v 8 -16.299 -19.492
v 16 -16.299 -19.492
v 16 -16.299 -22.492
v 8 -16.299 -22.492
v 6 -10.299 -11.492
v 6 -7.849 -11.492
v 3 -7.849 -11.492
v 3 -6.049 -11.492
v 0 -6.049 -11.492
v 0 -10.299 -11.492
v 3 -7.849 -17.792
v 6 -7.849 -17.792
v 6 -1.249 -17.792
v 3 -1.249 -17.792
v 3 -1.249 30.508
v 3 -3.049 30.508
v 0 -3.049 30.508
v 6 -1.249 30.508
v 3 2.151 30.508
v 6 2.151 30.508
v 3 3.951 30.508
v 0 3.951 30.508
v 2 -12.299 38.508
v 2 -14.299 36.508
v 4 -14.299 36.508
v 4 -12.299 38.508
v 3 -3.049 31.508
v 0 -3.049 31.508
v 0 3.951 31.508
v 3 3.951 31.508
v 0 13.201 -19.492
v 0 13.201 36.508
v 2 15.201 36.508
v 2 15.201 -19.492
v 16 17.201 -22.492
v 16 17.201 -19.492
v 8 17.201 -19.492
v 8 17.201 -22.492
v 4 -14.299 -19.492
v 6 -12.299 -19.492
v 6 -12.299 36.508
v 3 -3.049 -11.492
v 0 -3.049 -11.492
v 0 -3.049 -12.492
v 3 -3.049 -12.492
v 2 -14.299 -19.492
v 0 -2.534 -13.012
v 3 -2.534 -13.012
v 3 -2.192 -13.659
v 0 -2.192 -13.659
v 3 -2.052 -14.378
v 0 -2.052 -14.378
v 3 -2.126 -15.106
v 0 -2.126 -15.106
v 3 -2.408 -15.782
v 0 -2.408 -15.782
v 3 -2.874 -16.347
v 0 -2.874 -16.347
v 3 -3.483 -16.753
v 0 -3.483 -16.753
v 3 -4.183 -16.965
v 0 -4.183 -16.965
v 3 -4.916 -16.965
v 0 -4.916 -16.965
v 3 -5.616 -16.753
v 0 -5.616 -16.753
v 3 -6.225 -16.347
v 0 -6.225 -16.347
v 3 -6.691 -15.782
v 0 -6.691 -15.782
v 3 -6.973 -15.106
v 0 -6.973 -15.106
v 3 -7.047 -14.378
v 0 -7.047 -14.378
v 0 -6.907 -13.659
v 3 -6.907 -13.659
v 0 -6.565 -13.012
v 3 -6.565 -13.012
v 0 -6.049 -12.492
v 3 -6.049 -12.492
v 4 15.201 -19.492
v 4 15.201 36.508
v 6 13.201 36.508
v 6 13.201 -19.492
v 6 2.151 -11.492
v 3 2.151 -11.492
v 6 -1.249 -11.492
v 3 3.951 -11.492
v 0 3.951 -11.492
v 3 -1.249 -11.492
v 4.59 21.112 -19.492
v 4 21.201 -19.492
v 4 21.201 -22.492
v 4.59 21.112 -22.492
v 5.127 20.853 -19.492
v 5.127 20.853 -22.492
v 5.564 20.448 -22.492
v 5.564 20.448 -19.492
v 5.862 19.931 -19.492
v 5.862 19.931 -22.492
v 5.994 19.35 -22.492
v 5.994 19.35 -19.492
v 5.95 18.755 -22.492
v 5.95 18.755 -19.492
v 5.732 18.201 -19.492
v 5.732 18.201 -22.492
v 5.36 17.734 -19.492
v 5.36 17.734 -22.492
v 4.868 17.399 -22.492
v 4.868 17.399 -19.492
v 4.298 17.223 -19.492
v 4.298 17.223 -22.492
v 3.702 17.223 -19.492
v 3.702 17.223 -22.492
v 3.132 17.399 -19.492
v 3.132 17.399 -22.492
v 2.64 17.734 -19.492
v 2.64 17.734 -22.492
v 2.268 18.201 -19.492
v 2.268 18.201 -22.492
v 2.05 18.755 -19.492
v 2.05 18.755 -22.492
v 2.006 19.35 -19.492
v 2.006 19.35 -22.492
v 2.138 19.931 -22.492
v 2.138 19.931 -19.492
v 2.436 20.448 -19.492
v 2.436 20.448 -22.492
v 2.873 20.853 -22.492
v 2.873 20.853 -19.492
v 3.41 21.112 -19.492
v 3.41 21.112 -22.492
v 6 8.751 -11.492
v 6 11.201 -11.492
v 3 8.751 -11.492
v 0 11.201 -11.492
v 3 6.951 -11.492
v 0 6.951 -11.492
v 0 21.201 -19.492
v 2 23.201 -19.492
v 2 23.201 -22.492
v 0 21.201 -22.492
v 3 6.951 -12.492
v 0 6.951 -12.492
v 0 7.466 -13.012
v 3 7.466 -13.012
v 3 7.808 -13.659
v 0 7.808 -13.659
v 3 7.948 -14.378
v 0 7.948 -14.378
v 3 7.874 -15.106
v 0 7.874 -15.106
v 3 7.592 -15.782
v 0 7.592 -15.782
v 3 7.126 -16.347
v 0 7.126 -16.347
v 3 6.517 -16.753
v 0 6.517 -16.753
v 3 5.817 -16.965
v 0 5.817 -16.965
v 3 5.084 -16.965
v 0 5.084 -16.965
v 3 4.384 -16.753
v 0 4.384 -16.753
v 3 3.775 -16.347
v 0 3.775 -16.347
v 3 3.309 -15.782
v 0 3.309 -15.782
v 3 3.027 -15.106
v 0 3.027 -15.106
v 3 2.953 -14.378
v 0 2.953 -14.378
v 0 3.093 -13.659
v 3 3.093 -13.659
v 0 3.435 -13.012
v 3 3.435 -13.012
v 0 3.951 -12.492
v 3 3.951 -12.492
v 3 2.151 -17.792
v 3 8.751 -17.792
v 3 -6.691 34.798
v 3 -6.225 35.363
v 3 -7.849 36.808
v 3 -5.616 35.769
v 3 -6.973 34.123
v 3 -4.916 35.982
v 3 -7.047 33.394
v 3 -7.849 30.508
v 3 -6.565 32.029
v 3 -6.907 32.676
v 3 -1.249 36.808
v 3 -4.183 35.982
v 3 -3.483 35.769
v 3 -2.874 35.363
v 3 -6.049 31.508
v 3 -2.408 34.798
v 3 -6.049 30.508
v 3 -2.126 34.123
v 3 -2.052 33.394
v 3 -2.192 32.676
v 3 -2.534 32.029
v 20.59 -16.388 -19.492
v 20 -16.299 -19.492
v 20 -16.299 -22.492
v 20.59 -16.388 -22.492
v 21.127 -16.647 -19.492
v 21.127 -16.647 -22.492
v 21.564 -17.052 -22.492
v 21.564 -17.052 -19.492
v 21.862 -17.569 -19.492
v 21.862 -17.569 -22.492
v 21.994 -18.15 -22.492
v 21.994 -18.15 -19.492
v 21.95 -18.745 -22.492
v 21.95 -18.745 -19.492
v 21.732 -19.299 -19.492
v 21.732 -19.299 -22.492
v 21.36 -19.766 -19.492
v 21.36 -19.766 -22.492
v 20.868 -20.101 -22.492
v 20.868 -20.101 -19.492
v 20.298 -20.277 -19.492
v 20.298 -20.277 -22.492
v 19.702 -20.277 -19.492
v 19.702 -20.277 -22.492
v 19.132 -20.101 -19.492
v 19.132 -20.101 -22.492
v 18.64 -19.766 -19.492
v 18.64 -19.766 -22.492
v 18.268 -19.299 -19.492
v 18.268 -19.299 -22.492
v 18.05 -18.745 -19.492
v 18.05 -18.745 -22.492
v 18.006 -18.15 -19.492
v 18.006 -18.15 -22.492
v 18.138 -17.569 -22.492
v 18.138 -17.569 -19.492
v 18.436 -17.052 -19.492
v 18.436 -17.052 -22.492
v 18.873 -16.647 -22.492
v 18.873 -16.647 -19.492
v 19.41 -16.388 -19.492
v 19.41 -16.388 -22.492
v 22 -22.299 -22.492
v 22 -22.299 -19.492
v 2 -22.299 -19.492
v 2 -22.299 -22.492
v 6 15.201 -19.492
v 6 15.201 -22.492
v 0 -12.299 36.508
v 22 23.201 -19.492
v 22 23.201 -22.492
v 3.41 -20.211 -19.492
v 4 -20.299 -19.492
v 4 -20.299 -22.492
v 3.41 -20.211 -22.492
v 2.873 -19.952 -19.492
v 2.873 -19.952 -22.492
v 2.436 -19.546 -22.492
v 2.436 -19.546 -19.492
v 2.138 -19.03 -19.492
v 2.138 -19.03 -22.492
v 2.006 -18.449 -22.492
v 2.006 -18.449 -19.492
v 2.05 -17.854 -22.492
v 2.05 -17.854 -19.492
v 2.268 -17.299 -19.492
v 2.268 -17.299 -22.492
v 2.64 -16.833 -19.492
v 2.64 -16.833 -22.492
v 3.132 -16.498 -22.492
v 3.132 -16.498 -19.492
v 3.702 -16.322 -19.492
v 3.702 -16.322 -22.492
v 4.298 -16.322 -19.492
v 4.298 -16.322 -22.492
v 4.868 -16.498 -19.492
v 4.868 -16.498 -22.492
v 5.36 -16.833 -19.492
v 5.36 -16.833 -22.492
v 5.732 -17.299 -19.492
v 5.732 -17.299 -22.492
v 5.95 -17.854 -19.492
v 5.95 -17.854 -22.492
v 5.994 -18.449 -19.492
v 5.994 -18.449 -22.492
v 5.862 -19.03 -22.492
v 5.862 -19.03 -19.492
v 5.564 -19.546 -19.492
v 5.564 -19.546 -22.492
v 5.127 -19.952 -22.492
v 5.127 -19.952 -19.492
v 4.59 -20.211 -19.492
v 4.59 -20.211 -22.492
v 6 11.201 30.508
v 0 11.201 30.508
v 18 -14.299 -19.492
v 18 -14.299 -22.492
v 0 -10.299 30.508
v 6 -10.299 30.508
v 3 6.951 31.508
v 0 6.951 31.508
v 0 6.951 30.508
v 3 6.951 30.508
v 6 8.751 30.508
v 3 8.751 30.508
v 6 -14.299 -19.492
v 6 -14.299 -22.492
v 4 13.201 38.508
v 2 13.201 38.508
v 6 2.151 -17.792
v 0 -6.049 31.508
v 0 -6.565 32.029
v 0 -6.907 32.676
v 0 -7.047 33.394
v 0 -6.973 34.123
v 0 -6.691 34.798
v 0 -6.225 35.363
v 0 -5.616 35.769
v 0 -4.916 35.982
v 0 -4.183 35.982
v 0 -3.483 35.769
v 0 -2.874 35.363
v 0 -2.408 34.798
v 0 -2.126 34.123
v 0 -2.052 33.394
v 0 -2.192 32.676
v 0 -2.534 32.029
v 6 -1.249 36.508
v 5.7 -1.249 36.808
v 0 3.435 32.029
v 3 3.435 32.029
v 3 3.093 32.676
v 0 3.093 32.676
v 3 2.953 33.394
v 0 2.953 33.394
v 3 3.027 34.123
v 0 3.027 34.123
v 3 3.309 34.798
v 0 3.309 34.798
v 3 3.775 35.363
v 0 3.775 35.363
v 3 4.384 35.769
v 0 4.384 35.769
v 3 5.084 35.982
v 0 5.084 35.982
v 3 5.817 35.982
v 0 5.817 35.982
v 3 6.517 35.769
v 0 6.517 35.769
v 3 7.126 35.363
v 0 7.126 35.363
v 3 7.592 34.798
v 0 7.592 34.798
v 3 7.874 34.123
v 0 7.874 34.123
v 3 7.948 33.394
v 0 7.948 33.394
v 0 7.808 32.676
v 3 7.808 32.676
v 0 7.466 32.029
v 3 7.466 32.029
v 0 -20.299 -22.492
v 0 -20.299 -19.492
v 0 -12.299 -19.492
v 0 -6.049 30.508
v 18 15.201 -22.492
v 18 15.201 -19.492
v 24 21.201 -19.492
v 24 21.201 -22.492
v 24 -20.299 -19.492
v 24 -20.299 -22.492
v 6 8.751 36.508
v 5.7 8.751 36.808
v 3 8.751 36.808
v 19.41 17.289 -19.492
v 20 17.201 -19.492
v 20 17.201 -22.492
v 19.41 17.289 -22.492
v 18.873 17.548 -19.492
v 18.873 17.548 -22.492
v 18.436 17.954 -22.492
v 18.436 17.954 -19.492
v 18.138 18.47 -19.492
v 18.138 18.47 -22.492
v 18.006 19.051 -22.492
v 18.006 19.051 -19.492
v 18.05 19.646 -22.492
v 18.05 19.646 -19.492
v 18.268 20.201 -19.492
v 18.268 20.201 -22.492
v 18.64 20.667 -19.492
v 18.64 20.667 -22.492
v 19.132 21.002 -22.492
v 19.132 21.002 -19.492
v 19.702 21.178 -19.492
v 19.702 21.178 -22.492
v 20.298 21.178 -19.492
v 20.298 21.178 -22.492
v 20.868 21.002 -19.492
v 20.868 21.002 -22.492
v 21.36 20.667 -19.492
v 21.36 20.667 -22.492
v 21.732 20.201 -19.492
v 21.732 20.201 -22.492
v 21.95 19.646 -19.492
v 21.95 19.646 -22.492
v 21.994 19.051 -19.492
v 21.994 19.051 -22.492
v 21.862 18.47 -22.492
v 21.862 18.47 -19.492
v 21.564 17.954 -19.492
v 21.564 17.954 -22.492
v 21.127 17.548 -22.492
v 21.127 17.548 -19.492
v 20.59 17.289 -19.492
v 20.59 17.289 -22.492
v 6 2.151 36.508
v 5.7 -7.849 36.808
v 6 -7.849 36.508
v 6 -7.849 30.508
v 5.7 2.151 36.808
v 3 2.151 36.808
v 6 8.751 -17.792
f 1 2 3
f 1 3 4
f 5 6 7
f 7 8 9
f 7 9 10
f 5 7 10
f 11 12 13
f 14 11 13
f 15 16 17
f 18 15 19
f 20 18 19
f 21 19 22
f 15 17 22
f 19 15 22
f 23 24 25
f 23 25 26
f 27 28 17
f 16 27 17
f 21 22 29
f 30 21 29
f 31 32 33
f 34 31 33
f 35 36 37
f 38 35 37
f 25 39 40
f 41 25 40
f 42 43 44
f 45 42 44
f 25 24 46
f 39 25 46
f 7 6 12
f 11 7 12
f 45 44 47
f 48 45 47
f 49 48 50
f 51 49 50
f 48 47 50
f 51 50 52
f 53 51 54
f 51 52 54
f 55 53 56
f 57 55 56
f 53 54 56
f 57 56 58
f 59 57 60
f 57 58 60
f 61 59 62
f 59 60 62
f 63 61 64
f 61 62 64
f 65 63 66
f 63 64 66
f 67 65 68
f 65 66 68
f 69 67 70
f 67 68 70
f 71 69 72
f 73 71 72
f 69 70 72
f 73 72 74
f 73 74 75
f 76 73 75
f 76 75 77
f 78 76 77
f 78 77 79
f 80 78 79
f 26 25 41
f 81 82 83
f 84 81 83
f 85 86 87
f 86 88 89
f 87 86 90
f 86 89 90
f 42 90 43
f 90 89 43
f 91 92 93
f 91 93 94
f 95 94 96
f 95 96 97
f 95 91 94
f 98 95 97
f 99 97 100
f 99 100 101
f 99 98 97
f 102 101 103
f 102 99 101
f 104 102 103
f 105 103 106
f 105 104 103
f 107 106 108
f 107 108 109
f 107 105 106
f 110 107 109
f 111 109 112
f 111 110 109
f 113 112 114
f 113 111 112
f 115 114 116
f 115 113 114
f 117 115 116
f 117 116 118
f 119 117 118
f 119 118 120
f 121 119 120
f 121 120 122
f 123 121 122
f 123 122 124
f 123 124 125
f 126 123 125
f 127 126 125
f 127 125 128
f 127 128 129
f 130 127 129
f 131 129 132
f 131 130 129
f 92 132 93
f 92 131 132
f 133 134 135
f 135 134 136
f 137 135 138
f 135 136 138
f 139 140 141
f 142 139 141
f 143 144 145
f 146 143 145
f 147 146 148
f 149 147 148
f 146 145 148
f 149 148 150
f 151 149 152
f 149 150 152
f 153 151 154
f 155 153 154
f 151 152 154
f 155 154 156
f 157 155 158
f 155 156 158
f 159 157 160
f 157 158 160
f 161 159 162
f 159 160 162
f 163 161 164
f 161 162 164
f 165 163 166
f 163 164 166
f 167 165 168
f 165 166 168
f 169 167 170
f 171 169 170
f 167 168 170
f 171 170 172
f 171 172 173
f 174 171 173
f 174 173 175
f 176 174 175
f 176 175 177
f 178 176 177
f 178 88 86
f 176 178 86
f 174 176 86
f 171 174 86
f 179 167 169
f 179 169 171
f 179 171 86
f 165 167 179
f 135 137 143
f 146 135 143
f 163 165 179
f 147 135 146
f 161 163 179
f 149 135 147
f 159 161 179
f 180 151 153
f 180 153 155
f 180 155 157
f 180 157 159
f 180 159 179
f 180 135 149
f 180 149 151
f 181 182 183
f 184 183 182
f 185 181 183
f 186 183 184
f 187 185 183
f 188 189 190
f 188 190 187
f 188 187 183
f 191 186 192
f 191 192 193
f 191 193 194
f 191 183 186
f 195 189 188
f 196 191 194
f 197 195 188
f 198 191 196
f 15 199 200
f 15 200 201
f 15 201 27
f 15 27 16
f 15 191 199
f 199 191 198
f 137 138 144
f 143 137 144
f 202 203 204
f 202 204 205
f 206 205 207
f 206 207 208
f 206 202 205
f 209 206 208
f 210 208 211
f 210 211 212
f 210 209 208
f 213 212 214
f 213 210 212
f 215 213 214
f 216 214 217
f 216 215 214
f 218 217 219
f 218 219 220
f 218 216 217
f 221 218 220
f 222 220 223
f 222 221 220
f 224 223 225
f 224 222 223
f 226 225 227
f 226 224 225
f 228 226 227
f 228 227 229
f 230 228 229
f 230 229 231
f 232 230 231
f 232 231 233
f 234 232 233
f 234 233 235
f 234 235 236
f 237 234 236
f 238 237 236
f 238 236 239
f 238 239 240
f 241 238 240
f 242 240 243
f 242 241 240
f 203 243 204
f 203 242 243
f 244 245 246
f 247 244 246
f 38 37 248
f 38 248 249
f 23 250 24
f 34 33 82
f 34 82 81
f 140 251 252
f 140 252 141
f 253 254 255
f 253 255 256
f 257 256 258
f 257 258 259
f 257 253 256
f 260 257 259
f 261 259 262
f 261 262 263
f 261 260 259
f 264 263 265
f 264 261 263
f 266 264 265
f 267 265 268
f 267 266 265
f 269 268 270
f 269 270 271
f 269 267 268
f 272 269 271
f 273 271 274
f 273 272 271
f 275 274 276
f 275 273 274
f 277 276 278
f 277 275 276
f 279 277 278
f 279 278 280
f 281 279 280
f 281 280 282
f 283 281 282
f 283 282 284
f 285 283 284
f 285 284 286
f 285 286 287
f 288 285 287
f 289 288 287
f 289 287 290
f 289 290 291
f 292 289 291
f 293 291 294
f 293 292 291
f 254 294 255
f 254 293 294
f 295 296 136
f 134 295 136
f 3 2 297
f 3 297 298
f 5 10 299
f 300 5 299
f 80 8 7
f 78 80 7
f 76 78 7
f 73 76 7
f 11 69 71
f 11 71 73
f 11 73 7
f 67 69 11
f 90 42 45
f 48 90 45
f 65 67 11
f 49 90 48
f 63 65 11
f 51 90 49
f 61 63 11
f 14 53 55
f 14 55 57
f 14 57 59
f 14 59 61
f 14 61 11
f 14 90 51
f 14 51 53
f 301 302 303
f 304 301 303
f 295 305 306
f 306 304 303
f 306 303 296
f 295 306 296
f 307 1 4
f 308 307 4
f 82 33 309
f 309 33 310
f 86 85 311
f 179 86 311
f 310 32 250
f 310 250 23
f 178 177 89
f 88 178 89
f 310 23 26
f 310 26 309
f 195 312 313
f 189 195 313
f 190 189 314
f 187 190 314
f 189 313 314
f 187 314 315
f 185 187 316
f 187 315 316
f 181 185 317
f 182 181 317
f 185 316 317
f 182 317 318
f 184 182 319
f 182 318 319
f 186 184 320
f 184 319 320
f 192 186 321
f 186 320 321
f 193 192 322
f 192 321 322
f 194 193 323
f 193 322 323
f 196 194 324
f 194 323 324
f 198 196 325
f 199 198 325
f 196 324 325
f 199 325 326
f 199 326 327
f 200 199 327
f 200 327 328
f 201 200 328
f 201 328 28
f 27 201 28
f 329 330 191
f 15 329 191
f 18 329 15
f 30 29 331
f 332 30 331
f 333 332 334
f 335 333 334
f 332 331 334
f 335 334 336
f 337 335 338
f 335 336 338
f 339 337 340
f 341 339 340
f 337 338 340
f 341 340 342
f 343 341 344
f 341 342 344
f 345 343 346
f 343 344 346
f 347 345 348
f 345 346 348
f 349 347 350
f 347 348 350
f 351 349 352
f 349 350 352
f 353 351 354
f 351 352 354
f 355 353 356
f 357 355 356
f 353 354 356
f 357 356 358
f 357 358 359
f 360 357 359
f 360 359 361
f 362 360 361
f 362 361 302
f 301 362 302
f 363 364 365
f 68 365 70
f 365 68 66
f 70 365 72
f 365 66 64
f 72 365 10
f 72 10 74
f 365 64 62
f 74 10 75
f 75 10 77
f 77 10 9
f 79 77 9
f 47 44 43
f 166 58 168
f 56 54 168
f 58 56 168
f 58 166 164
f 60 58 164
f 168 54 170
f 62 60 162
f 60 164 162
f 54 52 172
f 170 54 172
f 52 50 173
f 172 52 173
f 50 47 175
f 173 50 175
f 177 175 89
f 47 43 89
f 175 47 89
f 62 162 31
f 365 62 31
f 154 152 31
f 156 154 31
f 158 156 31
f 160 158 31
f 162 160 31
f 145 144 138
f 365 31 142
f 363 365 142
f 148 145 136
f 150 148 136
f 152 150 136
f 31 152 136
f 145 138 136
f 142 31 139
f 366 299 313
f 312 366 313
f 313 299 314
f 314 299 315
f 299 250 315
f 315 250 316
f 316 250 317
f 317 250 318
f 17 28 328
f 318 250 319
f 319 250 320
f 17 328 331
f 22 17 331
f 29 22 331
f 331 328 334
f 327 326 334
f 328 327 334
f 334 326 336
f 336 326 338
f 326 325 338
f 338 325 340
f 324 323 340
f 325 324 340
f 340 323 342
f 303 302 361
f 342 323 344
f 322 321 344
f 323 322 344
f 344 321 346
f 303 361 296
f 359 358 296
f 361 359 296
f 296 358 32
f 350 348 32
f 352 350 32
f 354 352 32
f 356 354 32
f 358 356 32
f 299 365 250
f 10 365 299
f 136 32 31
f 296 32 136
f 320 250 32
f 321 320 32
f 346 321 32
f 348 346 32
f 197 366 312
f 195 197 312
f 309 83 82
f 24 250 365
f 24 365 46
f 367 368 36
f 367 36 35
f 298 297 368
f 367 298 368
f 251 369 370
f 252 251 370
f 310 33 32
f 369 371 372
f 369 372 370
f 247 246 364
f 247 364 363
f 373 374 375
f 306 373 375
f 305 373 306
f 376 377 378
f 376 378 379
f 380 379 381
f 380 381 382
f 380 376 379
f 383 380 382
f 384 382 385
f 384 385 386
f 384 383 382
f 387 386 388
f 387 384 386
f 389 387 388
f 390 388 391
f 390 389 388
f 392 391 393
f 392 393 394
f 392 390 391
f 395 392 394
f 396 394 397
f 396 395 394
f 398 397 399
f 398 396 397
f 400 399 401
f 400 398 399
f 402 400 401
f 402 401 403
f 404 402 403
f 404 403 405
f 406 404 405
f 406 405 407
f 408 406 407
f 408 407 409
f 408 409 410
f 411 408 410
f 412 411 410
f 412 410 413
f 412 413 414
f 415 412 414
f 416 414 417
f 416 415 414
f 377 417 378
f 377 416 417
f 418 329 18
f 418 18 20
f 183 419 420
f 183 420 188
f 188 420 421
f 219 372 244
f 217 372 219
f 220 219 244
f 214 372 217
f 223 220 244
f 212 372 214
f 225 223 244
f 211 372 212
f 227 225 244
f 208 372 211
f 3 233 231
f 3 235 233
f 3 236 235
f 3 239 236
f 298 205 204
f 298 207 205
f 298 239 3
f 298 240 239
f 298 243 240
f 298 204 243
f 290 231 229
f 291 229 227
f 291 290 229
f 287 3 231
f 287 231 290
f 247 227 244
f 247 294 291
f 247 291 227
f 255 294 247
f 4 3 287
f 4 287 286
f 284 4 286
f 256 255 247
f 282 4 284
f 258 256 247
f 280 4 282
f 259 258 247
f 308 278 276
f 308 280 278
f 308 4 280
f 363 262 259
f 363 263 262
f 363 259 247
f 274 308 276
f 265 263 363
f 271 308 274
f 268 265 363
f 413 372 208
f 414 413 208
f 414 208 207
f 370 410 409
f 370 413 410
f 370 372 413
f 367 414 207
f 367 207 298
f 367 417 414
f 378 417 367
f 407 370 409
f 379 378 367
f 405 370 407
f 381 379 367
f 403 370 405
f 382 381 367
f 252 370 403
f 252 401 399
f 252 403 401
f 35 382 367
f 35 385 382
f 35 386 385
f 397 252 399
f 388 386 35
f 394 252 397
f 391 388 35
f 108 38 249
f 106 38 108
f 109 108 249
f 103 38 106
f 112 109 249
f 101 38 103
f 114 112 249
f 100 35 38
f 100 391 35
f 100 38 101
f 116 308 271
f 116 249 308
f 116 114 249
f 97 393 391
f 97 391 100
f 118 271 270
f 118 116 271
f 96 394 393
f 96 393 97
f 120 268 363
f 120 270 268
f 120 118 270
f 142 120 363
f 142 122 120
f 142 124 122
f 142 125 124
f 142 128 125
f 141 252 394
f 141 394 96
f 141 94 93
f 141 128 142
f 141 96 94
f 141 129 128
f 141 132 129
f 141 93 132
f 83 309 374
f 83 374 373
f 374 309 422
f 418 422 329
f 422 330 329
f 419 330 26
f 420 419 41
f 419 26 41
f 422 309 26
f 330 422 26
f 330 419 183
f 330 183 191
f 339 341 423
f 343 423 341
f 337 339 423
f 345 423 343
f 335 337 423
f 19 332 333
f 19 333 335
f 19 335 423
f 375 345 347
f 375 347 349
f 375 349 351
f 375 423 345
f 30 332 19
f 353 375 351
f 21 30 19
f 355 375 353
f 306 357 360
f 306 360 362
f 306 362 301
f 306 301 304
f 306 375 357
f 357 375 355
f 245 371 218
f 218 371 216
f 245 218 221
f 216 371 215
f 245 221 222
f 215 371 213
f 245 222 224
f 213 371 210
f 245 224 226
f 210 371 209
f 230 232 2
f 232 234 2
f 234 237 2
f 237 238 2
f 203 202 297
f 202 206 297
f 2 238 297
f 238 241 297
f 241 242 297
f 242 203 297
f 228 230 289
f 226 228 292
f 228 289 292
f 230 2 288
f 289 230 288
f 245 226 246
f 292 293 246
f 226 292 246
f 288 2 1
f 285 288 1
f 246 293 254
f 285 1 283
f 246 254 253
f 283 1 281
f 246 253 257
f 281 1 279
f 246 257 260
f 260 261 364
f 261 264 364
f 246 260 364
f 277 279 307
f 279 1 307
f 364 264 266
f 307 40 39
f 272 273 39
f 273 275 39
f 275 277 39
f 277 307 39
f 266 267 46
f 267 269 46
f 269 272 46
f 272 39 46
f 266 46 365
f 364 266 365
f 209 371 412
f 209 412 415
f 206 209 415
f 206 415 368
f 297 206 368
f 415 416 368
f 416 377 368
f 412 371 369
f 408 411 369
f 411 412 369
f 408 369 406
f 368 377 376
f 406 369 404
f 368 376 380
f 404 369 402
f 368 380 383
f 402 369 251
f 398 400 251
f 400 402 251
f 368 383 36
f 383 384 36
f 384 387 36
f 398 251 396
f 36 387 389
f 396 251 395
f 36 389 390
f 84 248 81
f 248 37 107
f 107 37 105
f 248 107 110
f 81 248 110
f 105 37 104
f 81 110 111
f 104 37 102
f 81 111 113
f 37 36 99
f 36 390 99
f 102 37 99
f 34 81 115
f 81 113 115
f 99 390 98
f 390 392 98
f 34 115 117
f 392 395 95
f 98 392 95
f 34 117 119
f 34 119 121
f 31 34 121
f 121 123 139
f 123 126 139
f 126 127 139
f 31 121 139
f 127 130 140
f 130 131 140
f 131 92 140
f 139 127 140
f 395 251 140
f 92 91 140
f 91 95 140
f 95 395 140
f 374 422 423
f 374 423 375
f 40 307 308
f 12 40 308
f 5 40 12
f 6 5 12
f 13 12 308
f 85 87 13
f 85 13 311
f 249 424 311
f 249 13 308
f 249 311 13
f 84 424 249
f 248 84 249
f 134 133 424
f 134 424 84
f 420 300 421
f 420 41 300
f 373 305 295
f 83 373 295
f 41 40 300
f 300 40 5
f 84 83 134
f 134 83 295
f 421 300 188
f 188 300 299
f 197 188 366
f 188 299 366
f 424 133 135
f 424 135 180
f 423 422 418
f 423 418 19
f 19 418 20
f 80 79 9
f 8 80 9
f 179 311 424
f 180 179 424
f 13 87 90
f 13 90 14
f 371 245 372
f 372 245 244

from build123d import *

# Parameters (mm, degrees)
SKETCH1_W           = 58
SKETCH1_H           = 29.5
BOSS_EXTRUDE1_DEPTH = 6
SKETCH2_W           = 6.6
SKETCH2_H           = 6.6
CUT_EXTRUDE1_DEPTH  = 3
SKETCH3_W           = 24
SKETCH3_H           = 45.5
SKETCH3_R           = 2
SKETCH3_W_2         = 12
SKETCH3_H_2         = 33.5
BOSS_EXTRUDE2_DEPTH = 3
CHAMFER5_SIZE       = 2
CHAMFER6_SIZE       = 2
CHAMFER7_SIZE       = 2


with BuildPart() as part:
    # Sketch1 → Boss-Extrude1 (new body)
    with BuildSketch(Plane(origin=(0, 0, 0), x_dir=(0, 0, -1), z_dir=(1, 0, 0))):
        with Locations((-9.508456449, 0.450525737)):
            Rectangle(SKETCH1_W, SKETCH1_H)
        with BuildLine():
            Line((-31.508456449, 6.950525737), (-30.508456449, 6.950525737))
            Line((-30.508456449, 6.950525737), (-30.508456449, 11.200525737))
            Line((-30.508456449, 11.200525737), (11.491543551, 11.200525737))
            Line((11.491543551, 11.200525737), (11.491543551, 6.950525737))
            Line((11.491543551, 6.950525737), (12.491543551, 6.950525737))
            ThreePointArc((12.491543551, 6.950525737), (16.991543551, 5.450525737), (12.491543551, 3.950525737))
            Line((12.491543551, 3.950525737), (11.491543551, 3.950525737))
            Line((11.491543551, 3.950525737), (11.491543551, -3.049474263))
            Line((11.491543551, -3.049474263), (12.491543551, -3.049474263))
            ThreePointArc((12.491543551, -3.049474263), (16.991543551, -4.549474263), (12.491543551, -6.049474263))
            Line((12.491543551, -6.049474263), (11.491543551, -6.049474263))
            Line((11.491543551, -6.049474263), (11.491543551, -10.299474263))
            Line((11.491543551, -10.299474263), (-30.508456449, -10.299474263))
            Line((-30.508456449, -10.299474263), (-30.508456449, -6.049474263))
            Line((-30.508456449, -6.049474263), (-31.508456449, -6.049474263))
            ThreePointArc((-31.508456449, -6.049474263), (-36.008456449, -4.549474263), (-31.508456449, -3.049474263))
            Line((-31.508456449, -3.049474263), (-30.508456449, -3.049474263))
            Line((-30.508456449, -3.049474263), (-30.508456449, 3.950525737))
            Line((-30.508456449, 3.950525737), (-31.508456449, 3.950525737))
            ThreePointArc((-31.508456449, 3.950525737), (-36.008456449, 5.450525737), (-31.508456449, 6.950525737))
        make_face(mode=Mode.SUBTRACT)
    extrude(amount=BOSS_EXTRUDE1_DEPTH)

    # Sketch2 → Cut-Extrude1 (cut)
    with BuildSketch(Plane(origin=(6, 0, 0), x_dir=(0, 0, -1), z_dir=(1, 0, 0))):
        with Locations((-33.508456449, 5.450525737)):
            Rectangle(SKETCH2_W, SKETCH2_H)
        with Locations((14.491543551, 5.450525737)):
            Rectangle(SKETCH2_W, SKETCH2_H)
        with Locations((-33.508456449, -4.549474263)):
            Rectangle(SKETCH2_W, SKETCH2_H)
        with Locations((14.491543551, -4.549474263)):
            Rectangle(SKETCH2_W, SKETCH2_H)
    extrude(amount=-CUT_EXTRUDE1_DEPTH, mode=Mode.SUBTRACT)

    # Sketch3 → Boss-Extrude2 (add)
    with BuildSketch(Plane(origin=(0, 0, -19.491543551), x_dir=(-1, 0, 0), z_dir=(0, 0, -1))):
        with Locations((-12, 0.450525737)):
            Rectangle(SKETCH3_W, SKETCH3_H)
        with Locations(Location((-4, 19.200525737, 0), (0, 0, 90))):
            Circle(SKETCH3_R, mode=Mode.SUBTRACT)
        with Locations(Location((-20, 19.200525737, 0), (0, 0, 270))):
            Circle(SKETCH3_R, mode=Mode.SUBTRACT)
        with Locations(Location((-20, -18.299474263, 0), (0, 0, 90))):
            Circle(SKETCH3_R, mode=Mode.SUBTRACT)
        with Locations(Location((-4, -18.299474263, 0), (0, 0, 270))):
            Circle(SKETCH3_R, mode=Mode.SUBTRACT)
        with Locations((-12, 0.450525737)):
            Rectangle(SKETCH3_W_2, SKETCH3_H_2, mode=Mode.SUBTRACT)
    extrude(amount=BOSS_EXTRUDE2_DEPTH)

    # Chamfer5
    chamfer5_edges = [part.edges().sort_by_distance(p)[0] for p in [
        (6, 17.200525737, -20.991543551),
        (18, 17.200525737, -20.991543551),
        (18, -16.299474263, -20.991543551),
        (6, -16.299474263, -20.991543551),
    ]]
    chamfer(chamfer5_edges, length=CHAMFER5_SIZE)

    # Chamfer6
    chamfer6_edges = [part.edges().sort_by_distance(p)[0] for p in [
        (24, -22.299474263, -20.991543551),
        (0, -22.299474263, -20.991543551),
        (0, 23.200525737, -20.991543551),
        (24, 23.200525737, -20.991543551),
    ]]
    chamfer(chamfer6_edges, length=CHAMFER6_SIZE)

    # Chamfer7
    # the kernel refuses this chamfer: 2 mm, written as the material it takes off along each edge
    with BuildSketch(Plane(origin=(4.666666667, 13.867192404, 37.175123115), x_dir=(0.7071067811865474, -0.7071067811865477, 0), z_dir=(0.577350269189626, 0.5773502691896257, 0.5773502691896257)), Plane(origin=(1.333333333, 13.867192404, 37.175123115), x_dir=(0.7071067811865477, 0.7071067811865474, 0), z_dir=(-0.5773502691896256, 0.5773502691896258, 0.5773502691896258))) as chamfer7_piece_1:
        Polygon((-1.414213562, 0.816496581), (1.414213562, 0.816496581), (0, -1.632993162), align=None)
    extrude(amount=2.540341184, mode=Mode.SUBTRACT)
    with BuildSketch(Plane(origin=(4.666666667, -12.966140929, 37.175123115), x_dir=(0.7071067811865474, 0.7071067811865477, 0), z_dir=(0.577350269189626, -0.5773502691896257, 0.5773502691896257)), Plane(origin=(1.333333333, -12.966140929, 37.175123115), x_dir=(0.7071067811865477, -0.7071067811865474, 0), z_dir=(-0.5773502691896256, -0.5773502691896258, 0.5773502691896258))) as chamfer7_piece_2:
        Polygon((-1.414213562, -0.816496581), (1.414213562, -0.816496581), (0, 1.632993162), align=None)
    extrude(amount=2.540341184, mode=Mode.SUBTRACT)
    with BuildSketch(Plane(origin=(6, 15.200525737, 43.651822425), x_dir=(-0.9996219169112968, 0.027495876610586494, 0), z_dir=(0, 0, -1)), Plane(origin=(6, -14.299474263, -19.491543551), x_dir=(-0.9996219169112968, -0.027495876610586494, 0), z_dir=(0, 0, 1)), Plane(origin=(0, -14.299474263, -19.491543551), x_dir=(-0.027495876610586795, 0.9996219169112968, 0), z_dir=(0, 0, 1)), Plane(origin=(0, 15.200525737, 43.651822425), x_dir=(-0.027495876610586365, -0.9996219169112968, 0), z_dir=(0, 0, -1))) as chamfer7_piece_3:
        Polygon((CHAMFER7_SIZE * 0.999621916911, -CHAMFER7_SIZE * 0.0274958766106), (-CHAMFER7_SIZE * 0.0274958766106, -CHAMFER7_SIZE * 0.999621916911), (0, 0), align=None)
    extrude(amount=63.143365976, mode=Mode.SUBTRACT)
    with BuildSketch(Plane(origin=(6, -19.442840238, 38.508456449), x_dir=(-0.9996219169112968, 0, 0.02749587661058563), z_dir=(0, 1, 0)), Plane(origin=(0, -19.442840238, 38.508456449), x_dir=(-0.02749587661058639, 0, -0.9996219169112968), z_dir=(0, 1, 0))) as chamfer7_piece_4:
        Polygon((CHAMFER7_SIZE * 0.999621916911, -CHAMFER7_SIZE * 0.0274958766106), (-CHAMFER7_SIZE * 0.0274958766106, -CHAMFER7_SIZE * 0.999621916911), (0, 0), align=None)
    extrude(amount=39.786731952, mode=Mode.SUBTRACT)
    with BuildSketch(Plane(origin=(-5.143365976, -14.299474263, 38.508456449), x_dir=(0, -0.02749587661058651, -0.9996219169112968), z_dir=(1, 0, 0))) as chamfer7_piece_5:
        Polygon((CHAMFER7_SIZE * 0.999621916911, CHAMFER7_SIZE * 0.0274958766106), (-CHAMFER7_SIZE * 0.0274958766106, CHAMFER7_SIZE * 0.999621916911), (0, 0), align=None)
    extrude(amount=16.286731952, mode=Mode.SUBTRACT)
    with BuildSketch(Plane(origin=(-5.143365976, 15.200525737, 38.508456449), x_dir=(0, 0.02749587661058651, -0.9996219169112968), z_dir=(1, 0, 0))) as chamfer7_piece_6:
        Polygon((CHAMFER7_SIZE * 0.999621916911, -CHAMFER7_SIZE * 0.0274958766106), (-CHAMFER7_SIZE * 0.0274958766106, -CHAMFER7_SIZE * 0.999621916911), (0, 0), align=None)
    extrude(amount=16.286731952, mode=Mode.SUBTRACT)


solid = part.part
